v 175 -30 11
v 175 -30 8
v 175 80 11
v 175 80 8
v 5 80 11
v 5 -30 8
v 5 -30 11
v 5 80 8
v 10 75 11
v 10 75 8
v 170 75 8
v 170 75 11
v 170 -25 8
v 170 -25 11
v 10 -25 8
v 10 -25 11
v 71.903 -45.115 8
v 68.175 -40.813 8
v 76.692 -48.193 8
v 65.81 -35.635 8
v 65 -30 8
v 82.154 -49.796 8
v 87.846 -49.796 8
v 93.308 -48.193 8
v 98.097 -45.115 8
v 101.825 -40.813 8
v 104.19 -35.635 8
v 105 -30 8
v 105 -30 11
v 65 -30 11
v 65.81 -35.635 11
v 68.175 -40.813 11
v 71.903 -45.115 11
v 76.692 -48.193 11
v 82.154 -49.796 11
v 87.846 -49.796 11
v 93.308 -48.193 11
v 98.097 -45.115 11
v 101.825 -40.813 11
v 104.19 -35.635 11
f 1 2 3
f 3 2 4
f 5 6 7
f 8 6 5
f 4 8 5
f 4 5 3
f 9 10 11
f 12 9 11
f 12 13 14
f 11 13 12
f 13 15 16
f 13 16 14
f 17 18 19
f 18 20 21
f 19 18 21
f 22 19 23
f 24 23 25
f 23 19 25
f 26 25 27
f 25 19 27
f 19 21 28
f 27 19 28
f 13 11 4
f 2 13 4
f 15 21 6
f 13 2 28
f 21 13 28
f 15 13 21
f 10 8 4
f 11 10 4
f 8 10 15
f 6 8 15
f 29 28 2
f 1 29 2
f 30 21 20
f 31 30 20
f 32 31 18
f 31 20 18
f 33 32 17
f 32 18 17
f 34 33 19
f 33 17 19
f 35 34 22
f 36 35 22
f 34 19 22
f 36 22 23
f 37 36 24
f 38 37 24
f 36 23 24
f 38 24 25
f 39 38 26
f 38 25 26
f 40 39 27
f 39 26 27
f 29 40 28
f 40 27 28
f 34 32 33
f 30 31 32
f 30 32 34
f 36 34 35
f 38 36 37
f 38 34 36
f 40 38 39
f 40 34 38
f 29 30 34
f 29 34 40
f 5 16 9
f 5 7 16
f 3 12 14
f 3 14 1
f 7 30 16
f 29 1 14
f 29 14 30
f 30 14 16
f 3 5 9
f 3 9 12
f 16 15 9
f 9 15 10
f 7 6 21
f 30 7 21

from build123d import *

# Parameters (mm, degrees)
BOX004_W          = 160
BOX004_H          = 100
BOX004_DEPTH      = 5
CYLINDER001_R     = 20
CYLINDER001_DEPTH = 3
BOX003_W          = 170
BOX003_H          = 110
BOX003_DEPTH      = 3


with BuildPart() as box004:
    # Box004 → Box004 (new body)
    with BuildSketch(Plane(origin=(5, 5, 3), x_dir=(1, 0, 0), z_dir=(0, 0, 1))):
        with Locations((80, 50)):
            Rectangle(BOX004_W, BOX004_H)
    extrude(amount=BOX004_DEPTH)


with BuildPart() as cilindro001:
    # Cylinder001 → Cylinder001 (new body)
    with BuildSketch(Plane(origin=(80, 0, 0), x_dir=(1, 0, 0), z_dir=(0, 0, 1))):
        Circle(CYLINDER001_R)
    extrude(amount=CYLINDER001_DEPTH)


with BuildPart() as metacrilato2:
    # Box003 → Box003 (new body)
    with BuildSketch(Plane.XY):
        with Locations((85, 55)):
            Rectangle(BOX003_W, BOX003_H)
    extrude(amount=BOX003_DEPTH)

    # Fusion001: union Cilindro001
    add(cilindro001.part)


with BuildPart() as metacrilato2_1:
    # Fusion001 placement: moved
    add(metacrilato2.part.moved(Location((0, 0, 3))))

    # Cut004: cut Box004
    add(box004.part, mode=Mode.SUBTRACT)


with BuildPart() as metacrilato2_2:
    # Cut004 placement: moved
    add(metacrilato2_1.part.moved(Location((5, -30, 5))))


solid = metacrilato2_2.part
